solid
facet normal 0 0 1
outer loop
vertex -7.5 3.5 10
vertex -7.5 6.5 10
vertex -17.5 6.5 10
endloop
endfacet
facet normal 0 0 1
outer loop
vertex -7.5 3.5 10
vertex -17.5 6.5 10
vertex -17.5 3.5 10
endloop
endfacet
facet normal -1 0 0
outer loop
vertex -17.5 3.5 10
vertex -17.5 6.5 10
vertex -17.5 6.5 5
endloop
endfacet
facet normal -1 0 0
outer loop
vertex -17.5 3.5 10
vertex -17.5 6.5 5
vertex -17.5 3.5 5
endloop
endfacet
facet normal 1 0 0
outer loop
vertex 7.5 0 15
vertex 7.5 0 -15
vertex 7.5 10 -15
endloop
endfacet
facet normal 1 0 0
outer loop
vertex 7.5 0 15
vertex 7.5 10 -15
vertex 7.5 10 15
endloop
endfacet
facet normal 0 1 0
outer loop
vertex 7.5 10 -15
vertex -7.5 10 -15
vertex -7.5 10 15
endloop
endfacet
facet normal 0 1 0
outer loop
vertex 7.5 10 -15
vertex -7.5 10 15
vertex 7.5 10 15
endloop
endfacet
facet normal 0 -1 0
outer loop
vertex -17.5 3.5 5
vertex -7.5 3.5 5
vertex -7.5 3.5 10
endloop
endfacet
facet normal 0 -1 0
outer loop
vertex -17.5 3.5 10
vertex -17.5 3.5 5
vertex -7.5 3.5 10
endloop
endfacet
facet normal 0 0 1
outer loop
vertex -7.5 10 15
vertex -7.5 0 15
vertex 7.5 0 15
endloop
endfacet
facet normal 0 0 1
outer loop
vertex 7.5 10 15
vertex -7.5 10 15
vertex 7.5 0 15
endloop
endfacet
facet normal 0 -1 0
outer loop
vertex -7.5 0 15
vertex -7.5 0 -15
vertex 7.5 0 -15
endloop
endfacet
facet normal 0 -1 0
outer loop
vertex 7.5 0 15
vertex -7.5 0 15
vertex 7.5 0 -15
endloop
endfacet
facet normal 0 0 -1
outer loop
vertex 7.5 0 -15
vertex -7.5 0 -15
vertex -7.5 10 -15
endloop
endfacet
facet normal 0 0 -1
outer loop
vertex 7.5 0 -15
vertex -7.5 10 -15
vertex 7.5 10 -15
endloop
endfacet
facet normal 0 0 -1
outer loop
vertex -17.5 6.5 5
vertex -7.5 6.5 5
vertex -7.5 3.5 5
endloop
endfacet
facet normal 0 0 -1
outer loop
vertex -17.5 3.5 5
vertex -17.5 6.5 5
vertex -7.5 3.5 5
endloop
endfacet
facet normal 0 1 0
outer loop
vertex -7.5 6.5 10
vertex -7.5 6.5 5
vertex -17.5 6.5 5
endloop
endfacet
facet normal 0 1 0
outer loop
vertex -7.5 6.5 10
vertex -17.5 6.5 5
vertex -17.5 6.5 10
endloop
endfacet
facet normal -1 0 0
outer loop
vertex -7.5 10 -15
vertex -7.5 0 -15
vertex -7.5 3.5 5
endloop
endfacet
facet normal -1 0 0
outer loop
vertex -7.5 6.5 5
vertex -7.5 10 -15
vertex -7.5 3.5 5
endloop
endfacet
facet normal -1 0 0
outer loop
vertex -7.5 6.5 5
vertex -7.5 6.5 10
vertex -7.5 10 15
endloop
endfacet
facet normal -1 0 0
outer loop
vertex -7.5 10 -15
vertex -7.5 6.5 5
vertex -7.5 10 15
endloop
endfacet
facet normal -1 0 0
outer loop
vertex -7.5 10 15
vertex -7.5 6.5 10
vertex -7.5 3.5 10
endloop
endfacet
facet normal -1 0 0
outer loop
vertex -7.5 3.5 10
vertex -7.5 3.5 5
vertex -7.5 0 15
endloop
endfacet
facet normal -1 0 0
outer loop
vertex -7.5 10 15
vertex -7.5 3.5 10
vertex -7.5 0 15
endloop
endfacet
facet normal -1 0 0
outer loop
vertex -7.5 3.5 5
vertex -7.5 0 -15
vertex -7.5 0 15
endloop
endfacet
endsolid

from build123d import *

# Parameters (mm, degrees)
F0_W     = 15
F0_H     = 30
F1_DEPTH = 10
F2_W     = 3
F2_H     = 5
F3_DEPTH = 10


with BuildPart() as f1:
    # F0 (on Front) → F1 (new body)
    with BuildSketch(Plane.XZ):
        Rectangle(F0_W, F0_H)
    extrude(amount=-F1_DEPTH)

    # F2 (on face) → F3 (join)
    with BuildSketch(Plane(origin=(-7.5, 0, 0), x_dir=(0, -1, 0), z_dir=(-1, 0, 0))):
        with Locations((-5, 7.5)):
            Rectangle(F2_W, F2_H)
    extrude(amount=F3_DEPTH)


solid = f1.part
